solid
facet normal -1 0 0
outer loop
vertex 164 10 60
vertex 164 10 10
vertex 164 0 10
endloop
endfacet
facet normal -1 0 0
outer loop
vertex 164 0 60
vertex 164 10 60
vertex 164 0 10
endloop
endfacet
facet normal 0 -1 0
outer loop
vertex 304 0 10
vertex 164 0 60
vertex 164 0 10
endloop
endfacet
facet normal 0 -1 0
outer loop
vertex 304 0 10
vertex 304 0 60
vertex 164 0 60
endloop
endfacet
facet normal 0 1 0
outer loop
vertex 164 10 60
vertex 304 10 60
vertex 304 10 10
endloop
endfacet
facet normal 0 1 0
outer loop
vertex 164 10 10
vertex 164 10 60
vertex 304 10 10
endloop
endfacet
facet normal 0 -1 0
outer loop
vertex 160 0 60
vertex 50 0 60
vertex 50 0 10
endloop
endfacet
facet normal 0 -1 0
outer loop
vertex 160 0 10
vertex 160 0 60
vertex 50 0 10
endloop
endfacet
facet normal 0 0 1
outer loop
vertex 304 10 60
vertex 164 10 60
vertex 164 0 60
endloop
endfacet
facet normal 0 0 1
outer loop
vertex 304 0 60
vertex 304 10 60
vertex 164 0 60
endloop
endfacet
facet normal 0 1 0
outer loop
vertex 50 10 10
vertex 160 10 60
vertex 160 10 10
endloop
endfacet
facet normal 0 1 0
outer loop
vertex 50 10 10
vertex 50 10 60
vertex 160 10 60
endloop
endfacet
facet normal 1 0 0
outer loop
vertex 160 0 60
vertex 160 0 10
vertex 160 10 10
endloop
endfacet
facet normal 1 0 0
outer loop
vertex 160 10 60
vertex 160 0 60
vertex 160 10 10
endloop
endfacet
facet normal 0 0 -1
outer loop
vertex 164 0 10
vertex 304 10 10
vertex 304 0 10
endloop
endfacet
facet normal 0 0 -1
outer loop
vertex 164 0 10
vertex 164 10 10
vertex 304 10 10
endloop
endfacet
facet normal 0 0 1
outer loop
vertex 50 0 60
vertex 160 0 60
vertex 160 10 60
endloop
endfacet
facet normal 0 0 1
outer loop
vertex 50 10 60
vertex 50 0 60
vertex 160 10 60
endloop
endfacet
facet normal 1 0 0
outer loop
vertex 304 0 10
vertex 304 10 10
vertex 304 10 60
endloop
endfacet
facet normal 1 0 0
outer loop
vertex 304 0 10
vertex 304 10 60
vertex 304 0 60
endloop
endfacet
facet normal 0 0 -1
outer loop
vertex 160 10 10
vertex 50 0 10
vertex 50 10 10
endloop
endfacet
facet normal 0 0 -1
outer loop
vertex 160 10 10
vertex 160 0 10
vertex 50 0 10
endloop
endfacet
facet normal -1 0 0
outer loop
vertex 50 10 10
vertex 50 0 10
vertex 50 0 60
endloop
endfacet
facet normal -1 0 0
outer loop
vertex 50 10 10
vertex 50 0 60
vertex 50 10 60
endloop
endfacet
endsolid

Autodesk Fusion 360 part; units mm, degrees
box "BoxPrimitive1" add length 50 width 110 height 10 placed x (0, 0, -1) y (-1, 0, 0) z (0, 1, 0) at (160, 0, 60) makes body 1
box "BoxPrimitive1'" add length 50 width 140 height 10 placed x (0, 0, -1) y (-1, 0, 0) z (0, 1, 0) at (350, 0, 50) separate body makes body 2 in component "Component"
component "Component" placed x (-1, 0, 0) y (0, -1, 0) z (0, 0, 1) at (514, 10, 10)
